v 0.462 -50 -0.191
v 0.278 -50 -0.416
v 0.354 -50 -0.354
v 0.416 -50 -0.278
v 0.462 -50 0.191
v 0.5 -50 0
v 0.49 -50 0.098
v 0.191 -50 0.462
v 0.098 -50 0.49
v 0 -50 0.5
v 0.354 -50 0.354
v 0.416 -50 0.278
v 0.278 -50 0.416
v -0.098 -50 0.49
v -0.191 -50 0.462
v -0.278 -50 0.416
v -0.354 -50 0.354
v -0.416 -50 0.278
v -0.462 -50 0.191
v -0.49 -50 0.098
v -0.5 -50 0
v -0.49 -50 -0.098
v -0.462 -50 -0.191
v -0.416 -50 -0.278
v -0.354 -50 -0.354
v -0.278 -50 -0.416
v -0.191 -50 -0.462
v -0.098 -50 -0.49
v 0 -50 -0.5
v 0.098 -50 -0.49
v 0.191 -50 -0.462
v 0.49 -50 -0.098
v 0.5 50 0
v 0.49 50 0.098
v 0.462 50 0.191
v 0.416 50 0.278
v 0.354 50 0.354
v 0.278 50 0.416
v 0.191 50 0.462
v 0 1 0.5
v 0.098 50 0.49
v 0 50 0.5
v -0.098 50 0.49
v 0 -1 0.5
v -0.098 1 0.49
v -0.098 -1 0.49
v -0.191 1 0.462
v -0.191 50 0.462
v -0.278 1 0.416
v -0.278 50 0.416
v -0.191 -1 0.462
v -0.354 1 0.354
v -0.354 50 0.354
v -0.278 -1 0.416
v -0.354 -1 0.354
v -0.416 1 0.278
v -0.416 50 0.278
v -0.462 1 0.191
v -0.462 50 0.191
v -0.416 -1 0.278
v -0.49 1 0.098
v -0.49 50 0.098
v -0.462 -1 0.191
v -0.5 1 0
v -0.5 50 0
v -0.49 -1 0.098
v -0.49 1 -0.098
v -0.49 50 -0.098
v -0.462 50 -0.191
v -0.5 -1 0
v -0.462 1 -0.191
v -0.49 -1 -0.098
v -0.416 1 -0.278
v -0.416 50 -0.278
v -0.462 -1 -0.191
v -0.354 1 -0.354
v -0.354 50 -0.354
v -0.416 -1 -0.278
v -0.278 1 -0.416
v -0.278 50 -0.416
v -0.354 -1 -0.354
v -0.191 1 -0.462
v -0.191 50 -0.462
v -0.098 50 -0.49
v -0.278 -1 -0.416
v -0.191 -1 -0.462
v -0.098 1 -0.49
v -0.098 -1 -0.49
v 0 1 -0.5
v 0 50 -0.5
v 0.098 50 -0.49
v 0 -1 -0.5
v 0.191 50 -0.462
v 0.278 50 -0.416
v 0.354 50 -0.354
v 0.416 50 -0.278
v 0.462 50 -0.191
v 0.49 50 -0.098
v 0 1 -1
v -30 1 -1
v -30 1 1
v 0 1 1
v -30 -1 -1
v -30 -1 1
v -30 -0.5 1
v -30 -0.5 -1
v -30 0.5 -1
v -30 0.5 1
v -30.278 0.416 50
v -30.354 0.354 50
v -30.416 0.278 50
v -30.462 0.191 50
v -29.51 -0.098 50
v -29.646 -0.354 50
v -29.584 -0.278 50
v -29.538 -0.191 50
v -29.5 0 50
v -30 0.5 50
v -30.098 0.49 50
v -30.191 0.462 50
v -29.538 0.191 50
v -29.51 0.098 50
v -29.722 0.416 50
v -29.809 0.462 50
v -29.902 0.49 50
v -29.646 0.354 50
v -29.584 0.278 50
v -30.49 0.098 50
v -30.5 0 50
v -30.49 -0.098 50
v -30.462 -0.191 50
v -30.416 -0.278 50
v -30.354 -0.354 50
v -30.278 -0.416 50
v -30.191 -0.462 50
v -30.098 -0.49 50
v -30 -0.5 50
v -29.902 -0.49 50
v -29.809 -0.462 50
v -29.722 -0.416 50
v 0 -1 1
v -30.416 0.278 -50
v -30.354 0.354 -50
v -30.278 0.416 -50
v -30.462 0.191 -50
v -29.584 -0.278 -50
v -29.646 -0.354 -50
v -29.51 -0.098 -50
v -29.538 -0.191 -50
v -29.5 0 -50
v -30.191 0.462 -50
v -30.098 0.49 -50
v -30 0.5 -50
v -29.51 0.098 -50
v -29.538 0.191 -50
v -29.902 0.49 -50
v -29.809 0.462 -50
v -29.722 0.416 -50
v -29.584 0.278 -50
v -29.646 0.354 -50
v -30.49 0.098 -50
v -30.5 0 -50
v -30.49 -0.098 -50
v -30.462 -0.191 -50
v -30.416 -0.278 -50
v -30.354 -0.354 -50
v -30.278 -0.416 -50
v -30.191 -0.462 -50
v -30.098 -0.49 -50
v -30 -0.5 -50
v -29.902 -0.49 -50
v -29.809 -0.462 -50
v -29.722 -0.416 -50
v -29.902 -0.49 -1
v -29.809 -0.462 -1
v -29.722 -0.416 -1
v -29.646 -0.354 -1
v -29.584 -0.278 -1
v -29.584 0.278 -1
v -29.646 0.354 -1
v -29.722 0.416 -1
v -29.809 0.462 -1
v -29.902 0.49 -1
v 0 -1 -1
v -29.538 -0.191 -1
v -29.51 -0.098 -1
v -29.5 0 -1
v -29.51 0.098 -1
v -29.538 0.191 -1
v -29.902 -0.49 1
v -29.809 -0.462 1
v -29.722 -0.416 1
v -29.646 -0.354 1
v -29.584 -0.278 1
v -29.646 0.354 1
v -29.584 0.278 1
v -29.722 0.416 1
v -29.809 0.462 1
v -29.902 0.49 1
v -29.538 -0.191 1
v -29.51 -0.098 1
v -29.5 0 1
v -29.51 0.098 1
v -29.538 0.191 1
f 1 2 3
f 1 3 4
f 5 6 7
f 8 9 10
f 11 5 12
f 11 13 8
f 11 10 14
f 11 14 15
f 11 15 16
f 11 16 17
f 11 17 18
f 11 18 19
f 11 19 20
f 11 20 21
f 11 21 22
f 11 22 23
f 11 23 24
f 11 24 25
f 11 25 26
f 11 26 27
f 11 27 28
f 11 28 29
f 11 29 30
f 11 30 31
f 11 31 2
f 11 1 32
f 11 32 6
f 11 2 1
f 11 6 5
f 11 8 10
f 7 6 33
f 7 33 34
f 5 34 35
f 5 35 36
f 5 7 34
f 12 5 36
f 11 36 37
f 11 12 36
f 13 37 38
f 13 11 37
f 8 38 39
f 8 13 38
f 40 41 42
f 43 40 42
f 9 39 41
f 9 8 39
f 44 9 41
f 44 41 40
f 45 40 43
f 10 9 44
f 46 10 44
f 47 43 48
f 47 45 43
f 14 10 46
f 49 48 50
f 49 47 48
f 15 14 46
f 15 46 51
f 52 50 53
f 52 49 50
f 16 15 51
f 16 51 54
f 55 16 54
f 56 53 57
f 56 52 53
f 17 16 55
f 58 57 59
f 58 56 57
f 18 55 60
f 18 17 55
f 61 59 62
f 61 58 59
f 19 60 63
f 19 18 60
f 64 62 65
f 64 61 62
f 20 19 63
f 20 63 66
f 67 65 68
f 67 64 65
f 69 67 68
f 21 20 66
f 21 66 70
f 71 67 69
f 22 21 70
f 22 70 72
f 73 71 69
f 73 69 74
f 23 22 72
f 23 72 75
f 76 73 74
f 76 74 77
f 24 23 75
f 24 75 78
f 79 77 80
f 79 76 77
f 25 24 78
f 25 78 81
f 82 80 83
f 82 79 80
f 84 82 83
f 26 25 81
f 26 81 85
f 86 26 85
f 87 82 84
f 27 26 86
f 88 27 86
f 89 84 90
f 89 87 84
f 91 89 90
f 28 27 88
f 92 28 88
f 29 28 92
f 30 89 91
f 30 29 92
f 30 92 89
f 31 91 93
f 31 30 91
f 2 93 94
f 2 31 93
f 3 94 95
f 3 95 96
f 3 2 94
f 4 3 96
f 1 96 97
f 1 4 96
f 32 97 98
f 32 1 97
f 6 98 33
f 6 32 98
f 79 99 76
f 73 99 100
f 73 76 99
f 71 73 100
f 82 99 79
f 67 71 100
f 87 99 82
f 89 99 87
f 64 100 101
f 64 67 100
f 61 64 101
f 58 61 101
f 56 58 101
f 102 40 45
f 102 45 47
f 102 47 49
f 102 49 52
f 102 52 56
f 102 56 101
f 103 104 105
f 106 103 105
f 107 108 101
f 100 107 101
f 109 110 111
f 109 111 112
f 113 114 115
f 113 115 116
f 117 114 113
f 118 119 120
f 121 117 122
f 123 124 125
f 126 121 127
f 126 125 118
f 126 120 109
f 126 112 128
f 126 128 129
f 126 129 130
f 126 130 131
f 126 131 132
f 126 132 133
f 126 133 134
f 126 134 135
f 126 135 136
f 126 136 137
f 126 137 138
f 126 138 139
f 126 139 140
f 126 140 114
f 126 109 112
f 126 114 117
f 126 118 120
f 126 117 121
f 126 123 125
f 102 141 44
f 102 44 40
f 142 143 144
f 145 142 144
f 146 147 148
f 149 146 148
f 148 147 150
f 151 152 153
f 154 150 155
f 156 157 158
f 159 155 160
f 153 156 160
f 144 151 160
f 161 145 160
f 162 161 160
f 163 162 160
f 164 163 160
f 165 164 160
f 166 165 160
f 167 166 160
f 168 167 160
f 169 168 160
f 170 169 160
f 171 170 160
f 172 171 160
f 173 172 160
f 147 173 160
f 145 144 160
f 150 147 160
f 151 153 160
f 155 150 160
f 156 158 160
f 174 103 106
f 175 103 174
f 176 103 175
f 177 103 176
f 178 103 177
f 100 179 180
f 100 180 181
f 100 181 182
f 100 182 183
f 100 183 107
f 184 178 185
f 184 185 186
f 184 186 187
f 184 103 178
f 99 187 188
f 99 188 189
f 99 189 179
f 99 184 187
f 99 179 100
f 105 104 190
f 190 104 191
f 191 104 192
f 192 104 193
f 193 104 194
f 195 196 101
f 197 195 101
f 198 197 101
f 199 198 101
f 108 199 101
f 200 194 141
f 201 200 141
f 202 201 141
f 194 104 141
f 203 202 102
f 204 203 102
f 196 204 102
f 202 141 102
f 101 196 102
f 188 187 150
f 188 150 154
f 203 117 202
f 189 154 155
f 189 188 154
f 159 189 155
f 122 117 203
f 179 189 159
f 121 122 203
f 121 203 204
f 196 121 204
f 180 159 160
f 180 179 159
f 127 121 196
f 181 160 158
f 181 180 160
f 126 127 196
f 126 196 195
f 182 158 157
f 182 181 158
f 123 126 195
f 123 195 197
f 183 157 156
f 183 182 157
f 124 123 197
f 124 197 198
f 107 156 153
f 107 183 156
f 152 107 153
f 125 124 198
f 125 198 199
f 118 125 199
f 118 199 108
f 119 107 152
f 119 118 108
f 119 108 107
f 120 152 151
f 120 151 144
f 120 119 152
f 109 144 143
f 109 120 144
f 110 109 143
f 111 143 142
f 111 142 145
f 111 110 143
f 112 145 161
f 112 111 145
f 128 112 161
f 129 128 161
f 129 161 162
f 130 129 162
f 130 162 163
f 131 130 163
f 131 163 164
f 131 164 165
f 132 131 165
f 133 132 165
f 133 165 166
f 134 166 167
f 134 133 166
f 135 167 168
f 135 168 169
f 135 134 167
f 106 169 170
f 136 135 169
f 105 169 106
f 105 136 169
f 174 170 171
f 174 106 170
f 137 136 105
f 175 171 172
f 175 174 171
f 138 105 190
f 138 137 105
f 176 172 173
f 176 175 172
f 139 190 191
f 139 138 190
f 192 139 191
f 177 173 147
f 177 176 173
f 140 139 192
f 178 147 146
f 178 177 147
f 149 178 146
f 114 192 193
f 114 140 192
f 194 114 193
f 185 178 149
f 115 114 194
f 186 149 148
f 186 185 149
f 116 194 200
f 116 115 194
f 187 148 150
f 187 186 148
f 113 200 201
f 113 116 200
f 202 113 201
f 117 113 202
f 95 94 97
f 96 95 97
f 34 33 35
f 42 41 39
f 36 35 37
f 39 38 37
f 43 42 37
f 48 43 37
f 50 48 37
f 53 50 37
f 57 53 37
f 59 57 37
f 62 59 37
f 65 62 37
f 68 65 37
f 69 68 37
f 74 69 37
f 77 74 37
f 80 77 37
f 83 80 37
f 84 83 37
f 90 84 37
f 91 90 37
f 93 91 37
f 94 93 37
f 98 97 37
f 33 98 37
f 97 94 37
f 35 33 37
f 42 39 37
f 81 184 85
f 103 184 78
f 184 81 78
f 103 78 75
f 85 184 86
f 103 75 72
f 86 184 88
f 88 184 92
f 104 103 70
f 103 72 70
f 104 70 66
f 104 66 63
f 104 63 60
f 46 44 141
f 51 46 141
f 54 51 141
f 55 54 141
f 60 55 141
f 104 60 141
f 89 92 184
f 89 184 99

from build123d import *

# Parameters (mm, degrees)
F3_R     = 0.5
F4_DEPTH = 50
F5_R     = 0.5
F6_DEPTH = 50
F7_W     = 2
F7_H     = 2
F8_DEPTH = 30


with BuildPart() as f4:
    # F3 (on Front) → F4 (new body, symmetric)
    with BuildSketch(Plane.XZ):
        Circle(F3_R)
    extrude(amount=F4_DEPTH, both=True)



with BuildPart() as f6:
    # F5 (on Top) → F6 (new body, symmetric)
    with BuildSketch(Plane.XY):
        with Locations((-30, 0)):
            Circle(F5_R)
    extrude(amount=F6_DEPTH, both=True)


with BuildPart() as f4_1:
    add(f4.part)

    add(f6.part)  # F8 merges F6
    # F7 (on Right) → F8 (join)
    with BuildSketch(Plane.YZ):
        Rectangle(F7_W, F7_H)
    extrude(amount=-F8_DEPTH)


solid = f4_1.part
